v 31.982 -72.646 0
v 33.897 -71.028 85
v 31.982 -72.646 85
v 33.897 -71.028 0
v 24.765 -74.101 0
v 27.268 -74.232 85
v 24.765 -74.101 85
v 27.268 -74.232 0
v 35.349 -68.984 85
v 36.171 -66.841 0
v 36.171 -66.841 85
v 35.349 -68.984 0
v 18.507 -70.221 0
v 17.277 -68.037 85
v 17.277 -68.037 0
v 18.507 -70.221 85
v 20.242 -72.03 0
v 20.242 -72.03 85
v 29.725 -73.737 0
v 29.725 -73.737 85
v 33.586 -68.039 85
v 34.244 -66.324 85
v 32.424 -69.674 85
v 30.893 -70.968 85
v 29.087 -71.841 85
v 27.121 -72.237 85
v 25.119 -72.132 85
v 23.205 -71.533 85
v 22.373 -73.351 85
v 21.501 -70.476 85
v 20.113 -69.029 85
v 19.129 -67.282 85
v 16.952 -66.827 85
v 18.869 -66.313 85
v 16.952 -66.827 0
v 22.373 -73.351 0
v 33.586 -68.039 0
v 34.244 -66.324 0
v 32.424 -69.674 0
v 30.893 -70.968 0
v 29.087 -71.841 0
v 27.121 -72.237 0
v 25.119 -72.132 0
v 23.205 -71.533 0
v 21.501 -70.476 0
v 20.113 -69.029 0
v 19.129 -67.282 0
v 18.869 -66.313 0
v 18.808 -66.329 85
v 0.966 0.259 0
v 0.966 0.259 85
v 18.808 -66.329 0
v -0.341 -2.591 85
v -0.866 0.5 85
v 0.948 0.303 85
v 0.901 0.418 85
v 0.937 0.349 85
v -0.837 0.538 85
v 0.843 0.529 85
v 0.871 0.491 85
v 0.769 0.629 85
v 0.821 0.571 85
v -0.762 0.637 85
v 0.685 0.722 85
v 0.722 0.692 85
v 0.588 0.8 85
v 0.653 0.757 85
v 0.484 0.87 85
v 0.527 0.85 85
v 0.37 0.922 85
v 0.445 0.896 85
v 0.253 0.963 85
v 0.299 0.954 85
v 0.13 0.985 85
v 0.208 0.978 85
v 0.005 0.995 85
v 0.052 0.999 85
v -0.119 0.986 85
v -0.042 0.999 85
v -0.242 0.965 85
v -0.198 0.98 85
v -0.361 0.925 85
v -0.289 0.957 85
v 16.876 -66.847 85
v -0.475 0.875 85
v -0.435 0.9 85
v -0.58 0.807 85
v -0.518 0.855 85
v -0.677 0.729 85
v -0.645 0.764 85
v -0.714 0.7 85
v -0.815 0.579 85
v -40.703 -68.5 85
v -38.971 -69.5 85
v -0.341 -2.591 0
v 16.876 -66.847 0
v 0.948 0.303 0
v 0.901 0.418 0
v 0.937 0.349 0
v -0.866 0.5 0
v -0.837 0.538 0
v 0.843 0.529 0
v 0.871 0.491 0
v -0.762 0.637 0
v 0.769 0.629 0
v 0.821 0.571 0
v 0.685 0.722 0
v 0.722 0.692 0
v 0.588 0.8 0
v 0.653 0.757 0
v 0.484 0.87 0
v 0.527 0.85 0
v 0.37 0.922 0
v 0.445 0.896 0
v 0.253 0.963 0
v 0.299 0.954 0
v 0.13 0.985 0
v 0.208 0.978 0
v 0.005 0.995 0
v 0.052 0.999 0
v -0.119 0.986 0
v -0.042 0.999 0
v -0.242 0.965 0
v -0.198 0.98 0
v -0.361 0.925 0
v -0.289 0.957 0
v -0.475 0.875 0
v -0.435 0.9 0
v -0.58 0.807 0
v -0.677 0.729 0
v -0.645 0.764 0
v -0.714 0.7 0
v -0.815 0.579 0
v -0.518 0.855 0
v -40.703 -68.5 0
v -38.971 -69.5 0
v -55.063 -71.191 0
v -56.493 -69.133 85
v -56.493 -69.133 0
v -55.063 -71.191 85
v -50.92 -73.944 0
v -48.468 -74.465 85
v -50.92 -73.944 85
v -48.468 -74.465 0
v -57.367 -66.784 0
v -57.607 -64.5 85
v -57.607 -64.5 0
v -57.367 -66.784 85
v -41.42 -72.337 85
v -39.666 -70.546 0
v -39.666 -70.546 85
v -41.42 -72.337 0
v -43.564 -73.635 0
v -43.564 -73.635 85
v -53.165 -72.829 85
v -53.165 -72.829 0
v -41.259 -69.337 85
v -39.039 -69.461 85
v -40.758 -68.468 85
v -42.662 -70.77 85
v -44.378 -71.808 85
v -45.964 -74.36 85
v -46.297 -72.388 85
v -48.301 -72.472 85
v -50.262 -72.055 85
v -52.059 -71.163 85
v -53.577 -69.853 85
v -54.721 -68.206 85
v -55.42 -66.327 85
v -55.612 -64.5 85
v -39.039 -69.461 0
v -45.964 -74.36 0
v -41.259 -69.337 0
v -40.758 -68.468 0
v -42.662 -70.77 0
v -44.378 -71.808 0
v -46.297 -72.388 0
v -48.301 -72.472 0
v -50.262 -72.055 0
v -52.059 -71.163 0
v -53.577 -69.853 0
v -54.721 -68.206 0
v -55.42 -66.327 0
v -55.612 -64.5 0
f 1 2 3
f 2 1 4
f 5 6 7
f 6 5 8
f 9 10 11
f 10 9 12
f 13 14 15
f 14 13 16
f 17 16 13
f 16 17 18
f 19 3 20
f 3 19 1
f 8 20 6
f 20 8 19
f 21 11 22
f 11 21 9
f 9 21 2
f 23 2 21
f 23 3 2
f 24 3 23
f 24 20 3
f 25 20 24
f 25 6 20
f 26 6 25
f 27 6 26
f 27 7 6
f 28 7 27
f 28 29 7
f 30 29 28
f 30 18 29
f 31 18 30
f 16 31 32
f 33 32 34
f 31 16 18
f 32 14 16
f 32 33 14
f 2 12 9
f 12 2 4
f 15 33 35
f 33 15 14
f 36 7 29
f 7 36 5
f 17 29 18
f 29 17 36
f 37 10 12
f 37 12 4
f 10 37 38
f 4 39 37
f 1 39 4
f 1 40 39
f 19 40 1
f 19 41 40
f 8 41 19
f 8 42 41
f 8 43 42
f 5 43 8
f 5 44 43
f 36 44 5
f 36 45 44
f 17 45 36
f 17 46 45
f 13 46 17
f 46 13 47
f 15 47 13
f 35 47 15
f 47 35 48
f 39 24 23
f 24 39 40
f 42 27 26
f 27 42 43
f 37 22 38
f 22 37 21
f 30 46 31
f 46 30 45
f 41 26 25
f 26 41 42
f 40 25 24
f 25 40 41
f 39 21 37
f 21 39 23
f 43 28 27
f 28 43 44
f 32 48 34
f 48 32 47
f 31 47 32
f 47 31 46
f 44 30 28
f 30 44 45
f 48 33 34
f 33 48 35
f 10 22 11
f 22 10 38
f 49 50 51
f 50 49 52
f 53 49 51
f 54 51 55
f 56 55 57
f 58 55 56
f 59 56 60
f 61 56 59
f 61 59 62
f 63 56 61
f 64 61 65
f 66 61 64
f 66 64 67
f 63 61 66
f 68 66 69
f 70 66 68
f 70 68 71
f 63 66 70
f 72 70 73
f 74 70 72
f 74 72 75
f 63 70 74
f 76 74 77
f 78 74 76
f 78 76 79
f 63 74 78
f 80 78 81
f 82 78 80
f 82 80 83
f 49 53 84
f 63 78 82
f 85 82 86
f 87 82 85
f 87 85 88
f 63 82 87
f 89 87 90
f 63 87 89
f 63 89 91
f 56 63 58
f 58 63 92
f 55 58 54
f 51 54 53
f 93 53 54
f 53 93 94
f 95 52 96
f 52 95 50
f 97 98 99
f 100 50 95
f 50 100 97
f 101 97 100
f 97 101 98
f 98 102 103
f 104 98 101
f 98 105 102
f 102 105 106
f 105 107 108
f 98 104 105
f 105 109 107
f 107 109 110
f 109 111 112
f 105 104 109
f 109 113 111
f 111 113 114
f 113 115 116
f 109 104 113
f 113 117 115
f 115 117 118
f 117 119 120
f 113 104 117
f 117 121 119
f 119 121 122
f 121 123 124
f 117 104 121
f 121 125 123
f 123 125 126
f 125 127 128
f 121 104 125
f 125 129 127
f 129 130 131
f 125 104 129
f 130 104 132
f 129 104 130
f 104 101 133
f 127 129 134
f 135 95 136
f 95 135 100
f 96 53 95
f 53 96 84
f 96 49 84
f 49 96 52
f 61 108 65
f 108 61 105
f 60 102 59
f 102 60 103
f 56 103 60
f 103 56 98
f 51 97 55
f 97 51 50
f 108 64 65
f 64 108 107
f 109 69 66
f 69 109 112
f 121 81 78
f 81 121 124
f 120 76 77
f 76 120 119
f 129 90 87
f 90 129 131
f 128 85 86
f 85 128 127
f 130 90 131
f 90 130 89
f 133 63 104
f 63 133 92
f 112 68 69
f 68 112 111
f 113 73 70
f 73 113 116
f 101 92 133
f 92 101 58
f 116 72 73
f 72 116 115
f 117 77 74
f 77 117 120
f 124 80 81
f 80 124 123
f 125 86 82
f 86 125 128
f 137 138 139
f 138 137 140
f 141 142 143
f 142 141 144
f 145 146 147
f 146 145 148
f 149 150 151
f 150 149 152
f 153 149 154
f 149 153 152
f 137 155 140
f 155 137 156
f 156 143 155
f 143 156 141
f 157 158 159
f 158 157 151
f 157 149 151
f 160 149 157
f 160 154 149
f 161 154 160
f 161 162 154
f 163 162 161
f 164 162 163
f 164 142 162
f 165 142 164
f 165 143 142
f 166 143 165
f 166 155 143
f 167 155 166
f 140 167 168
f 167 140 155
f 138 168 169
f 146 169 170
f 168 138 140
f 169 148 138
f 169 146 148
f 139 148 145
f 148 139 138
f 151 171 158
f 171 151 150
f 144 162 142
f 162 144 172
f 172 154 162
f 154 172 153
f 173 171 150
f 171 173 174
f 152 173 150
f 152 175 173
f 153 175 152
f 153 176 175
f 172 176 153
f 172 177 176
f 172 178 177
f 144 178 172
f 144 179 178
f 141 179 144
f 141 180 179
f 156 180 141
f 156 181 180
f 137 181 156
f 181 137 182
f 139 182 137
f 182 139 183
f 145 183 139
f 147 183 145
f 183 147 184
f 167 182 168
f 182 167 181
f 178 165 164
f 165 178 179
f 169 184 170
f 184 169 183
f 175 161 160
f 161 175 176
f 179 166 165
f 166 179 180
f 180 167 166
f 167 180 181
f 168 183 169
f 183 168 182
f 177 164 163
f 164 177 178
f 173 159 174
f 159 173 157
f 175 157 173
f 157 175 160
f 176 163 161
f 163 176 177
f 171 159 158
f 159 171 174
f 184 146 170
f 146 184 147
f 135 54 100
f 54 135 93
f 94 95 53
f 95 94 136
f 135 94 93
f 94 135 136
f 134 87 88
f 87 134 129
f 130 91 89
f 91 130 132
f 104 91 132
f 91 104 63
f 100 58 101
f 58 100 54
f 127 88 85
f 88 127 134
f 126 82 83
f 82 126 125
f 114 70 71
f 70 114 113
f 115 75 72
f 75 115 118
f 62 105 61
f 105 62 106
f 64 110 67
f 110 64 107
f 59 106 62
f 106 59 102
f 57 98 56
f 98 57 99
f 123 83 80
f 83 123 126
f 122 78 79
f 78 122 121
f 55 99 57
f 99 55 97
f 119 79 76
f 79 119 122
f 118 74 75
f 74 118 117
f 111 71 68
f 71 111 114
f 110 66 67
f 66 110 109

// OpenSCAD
// Thingiverse customizer parameters

// How wide?
Stand_width = 85;					// [50: Narrow (50mm - e.g. phone), 85: Default (85mm - e.g. tablet or large phone), 120: Wide (120mm - e.g. small mammal)

// How tall?
Stand_height = 75;					// [65: Short (65mm), 75: Default (75mm), 95: Tall (95mm)

// How thick is your device (in mm)?
Slot_depth = 16;					// [5: 30]

// Angle in degrees (90 = vertical)
Front_rake = 75;					// [15: 5: 90]

// Angle in degrees (90 = vertical)
Rear_rake = 60;					// [15: 5: 90]

//use <../OpenSCAD_lib/common.scad>;
module position(translate = [], rotate = [], mirror = [0, 0, 0], colour)
{
	for (i = [0 : $children-1])
		translate(translate)
			rotate(rotate)
				mirror(mirror)
					if (colour == undef)
						children(i);
					else
						color(colour)
							children(i);
}

$fn = 25;
ff = 0.05;

def_width = Stand_width;
def_height = Stand_height;
def_slot_width = Slot_depth;
def_angle1 = Front_rake;
def_angle2 = Rear_rake;

def_ww = 2.0;

if (1)
	print();
else
	preview();

function default_if_undef(variable, default) = 
	variable == undef ? default : variable;

module print()
{
	stand();
}

module preview()
{
	position(
		colour = "lightblue",
		rotate = [90, 0, 45],
		translate = [0, 0, def_height])
		stand();
}

module stand(width, height, slot_width, angle1, angle2, wall_width)
{
	width = (width == undef ? def_width : width);
	height = (height == undef ? def_height : height);
	slot_width = (slot_width == undef ? def_slot_width : slot_width);
	angle1 = (angle1 == undef ? def_angle1 : angle1);
	angle2 = (angle2 == undef ? def_angle2 : angle2);
	wall_width = (wall_width == undef ? def_ww : wall_width);

	echo(str("QP056 ", width, "Wx", height,"H stand"));

	slot_ext = slot_width + 2*wall_width;

	side1_plate = (
		height									// total height
		- wall_width/2							// rounded top
		- (slot_ext/2 - (slot_ext/2) * sin(90-angle1))		// rounded bottom
		) / sin(angle1);

	side2_plate = (
		height									// total height
		- wall_width/2							// rounded top
		- (slot_ext/2 - (slot_ext/2) * sin(90-angle2))	// rounded bottom
		) / sin(angle2);

	position(
		rotate = [0, 0, 90 - angle1],
		translate = [])
			side(width = width, plate_length = side1_plate, slot_width = slot_width, wall_width = wall_width);

	position(
		mirror = [1, 0, 0],
		rotate = [0, 0, -90 + angle2],
		translate = [])
			side(width = width, plate_length = side2_plate, slot_width = slot_width, wall_width = wall_width);

}

module side(width, plate_length, slot_width, wall_width)
{
	slot_ext = slot_width + 2*wall_width;

	// slot
	translate([(slot_width + wall_width)/2, -plate_length, 0])
		difference()
		{
			// slot - external perimeter
			cylinder(h = width, r = slot_ext/2);

			// slot - internal perimiter
			translate([0, 0, -ff/2])
				cylinder(h = width + ff, r = slot_width/2);

			// mask
			translate([-(slot_ext + ff)/2, 0, -ff/2])
				cube([slot_ext + ff, slot_ext + ff, width+ff]);

			// slot bevel
			position(
				rotate = [0, 0, -30],
				translate = [0, 0, -ff/2])
				cube([slot_ext + ff, slot_ext + ff, width+ff]);
		}

	// main plate
	translate([-wall_width/2, -plate_length, 0])
		cube([wall_width, plate_length, width]);

	// rounded top
	cylinder(h = width, r = wall_width/2);
}
